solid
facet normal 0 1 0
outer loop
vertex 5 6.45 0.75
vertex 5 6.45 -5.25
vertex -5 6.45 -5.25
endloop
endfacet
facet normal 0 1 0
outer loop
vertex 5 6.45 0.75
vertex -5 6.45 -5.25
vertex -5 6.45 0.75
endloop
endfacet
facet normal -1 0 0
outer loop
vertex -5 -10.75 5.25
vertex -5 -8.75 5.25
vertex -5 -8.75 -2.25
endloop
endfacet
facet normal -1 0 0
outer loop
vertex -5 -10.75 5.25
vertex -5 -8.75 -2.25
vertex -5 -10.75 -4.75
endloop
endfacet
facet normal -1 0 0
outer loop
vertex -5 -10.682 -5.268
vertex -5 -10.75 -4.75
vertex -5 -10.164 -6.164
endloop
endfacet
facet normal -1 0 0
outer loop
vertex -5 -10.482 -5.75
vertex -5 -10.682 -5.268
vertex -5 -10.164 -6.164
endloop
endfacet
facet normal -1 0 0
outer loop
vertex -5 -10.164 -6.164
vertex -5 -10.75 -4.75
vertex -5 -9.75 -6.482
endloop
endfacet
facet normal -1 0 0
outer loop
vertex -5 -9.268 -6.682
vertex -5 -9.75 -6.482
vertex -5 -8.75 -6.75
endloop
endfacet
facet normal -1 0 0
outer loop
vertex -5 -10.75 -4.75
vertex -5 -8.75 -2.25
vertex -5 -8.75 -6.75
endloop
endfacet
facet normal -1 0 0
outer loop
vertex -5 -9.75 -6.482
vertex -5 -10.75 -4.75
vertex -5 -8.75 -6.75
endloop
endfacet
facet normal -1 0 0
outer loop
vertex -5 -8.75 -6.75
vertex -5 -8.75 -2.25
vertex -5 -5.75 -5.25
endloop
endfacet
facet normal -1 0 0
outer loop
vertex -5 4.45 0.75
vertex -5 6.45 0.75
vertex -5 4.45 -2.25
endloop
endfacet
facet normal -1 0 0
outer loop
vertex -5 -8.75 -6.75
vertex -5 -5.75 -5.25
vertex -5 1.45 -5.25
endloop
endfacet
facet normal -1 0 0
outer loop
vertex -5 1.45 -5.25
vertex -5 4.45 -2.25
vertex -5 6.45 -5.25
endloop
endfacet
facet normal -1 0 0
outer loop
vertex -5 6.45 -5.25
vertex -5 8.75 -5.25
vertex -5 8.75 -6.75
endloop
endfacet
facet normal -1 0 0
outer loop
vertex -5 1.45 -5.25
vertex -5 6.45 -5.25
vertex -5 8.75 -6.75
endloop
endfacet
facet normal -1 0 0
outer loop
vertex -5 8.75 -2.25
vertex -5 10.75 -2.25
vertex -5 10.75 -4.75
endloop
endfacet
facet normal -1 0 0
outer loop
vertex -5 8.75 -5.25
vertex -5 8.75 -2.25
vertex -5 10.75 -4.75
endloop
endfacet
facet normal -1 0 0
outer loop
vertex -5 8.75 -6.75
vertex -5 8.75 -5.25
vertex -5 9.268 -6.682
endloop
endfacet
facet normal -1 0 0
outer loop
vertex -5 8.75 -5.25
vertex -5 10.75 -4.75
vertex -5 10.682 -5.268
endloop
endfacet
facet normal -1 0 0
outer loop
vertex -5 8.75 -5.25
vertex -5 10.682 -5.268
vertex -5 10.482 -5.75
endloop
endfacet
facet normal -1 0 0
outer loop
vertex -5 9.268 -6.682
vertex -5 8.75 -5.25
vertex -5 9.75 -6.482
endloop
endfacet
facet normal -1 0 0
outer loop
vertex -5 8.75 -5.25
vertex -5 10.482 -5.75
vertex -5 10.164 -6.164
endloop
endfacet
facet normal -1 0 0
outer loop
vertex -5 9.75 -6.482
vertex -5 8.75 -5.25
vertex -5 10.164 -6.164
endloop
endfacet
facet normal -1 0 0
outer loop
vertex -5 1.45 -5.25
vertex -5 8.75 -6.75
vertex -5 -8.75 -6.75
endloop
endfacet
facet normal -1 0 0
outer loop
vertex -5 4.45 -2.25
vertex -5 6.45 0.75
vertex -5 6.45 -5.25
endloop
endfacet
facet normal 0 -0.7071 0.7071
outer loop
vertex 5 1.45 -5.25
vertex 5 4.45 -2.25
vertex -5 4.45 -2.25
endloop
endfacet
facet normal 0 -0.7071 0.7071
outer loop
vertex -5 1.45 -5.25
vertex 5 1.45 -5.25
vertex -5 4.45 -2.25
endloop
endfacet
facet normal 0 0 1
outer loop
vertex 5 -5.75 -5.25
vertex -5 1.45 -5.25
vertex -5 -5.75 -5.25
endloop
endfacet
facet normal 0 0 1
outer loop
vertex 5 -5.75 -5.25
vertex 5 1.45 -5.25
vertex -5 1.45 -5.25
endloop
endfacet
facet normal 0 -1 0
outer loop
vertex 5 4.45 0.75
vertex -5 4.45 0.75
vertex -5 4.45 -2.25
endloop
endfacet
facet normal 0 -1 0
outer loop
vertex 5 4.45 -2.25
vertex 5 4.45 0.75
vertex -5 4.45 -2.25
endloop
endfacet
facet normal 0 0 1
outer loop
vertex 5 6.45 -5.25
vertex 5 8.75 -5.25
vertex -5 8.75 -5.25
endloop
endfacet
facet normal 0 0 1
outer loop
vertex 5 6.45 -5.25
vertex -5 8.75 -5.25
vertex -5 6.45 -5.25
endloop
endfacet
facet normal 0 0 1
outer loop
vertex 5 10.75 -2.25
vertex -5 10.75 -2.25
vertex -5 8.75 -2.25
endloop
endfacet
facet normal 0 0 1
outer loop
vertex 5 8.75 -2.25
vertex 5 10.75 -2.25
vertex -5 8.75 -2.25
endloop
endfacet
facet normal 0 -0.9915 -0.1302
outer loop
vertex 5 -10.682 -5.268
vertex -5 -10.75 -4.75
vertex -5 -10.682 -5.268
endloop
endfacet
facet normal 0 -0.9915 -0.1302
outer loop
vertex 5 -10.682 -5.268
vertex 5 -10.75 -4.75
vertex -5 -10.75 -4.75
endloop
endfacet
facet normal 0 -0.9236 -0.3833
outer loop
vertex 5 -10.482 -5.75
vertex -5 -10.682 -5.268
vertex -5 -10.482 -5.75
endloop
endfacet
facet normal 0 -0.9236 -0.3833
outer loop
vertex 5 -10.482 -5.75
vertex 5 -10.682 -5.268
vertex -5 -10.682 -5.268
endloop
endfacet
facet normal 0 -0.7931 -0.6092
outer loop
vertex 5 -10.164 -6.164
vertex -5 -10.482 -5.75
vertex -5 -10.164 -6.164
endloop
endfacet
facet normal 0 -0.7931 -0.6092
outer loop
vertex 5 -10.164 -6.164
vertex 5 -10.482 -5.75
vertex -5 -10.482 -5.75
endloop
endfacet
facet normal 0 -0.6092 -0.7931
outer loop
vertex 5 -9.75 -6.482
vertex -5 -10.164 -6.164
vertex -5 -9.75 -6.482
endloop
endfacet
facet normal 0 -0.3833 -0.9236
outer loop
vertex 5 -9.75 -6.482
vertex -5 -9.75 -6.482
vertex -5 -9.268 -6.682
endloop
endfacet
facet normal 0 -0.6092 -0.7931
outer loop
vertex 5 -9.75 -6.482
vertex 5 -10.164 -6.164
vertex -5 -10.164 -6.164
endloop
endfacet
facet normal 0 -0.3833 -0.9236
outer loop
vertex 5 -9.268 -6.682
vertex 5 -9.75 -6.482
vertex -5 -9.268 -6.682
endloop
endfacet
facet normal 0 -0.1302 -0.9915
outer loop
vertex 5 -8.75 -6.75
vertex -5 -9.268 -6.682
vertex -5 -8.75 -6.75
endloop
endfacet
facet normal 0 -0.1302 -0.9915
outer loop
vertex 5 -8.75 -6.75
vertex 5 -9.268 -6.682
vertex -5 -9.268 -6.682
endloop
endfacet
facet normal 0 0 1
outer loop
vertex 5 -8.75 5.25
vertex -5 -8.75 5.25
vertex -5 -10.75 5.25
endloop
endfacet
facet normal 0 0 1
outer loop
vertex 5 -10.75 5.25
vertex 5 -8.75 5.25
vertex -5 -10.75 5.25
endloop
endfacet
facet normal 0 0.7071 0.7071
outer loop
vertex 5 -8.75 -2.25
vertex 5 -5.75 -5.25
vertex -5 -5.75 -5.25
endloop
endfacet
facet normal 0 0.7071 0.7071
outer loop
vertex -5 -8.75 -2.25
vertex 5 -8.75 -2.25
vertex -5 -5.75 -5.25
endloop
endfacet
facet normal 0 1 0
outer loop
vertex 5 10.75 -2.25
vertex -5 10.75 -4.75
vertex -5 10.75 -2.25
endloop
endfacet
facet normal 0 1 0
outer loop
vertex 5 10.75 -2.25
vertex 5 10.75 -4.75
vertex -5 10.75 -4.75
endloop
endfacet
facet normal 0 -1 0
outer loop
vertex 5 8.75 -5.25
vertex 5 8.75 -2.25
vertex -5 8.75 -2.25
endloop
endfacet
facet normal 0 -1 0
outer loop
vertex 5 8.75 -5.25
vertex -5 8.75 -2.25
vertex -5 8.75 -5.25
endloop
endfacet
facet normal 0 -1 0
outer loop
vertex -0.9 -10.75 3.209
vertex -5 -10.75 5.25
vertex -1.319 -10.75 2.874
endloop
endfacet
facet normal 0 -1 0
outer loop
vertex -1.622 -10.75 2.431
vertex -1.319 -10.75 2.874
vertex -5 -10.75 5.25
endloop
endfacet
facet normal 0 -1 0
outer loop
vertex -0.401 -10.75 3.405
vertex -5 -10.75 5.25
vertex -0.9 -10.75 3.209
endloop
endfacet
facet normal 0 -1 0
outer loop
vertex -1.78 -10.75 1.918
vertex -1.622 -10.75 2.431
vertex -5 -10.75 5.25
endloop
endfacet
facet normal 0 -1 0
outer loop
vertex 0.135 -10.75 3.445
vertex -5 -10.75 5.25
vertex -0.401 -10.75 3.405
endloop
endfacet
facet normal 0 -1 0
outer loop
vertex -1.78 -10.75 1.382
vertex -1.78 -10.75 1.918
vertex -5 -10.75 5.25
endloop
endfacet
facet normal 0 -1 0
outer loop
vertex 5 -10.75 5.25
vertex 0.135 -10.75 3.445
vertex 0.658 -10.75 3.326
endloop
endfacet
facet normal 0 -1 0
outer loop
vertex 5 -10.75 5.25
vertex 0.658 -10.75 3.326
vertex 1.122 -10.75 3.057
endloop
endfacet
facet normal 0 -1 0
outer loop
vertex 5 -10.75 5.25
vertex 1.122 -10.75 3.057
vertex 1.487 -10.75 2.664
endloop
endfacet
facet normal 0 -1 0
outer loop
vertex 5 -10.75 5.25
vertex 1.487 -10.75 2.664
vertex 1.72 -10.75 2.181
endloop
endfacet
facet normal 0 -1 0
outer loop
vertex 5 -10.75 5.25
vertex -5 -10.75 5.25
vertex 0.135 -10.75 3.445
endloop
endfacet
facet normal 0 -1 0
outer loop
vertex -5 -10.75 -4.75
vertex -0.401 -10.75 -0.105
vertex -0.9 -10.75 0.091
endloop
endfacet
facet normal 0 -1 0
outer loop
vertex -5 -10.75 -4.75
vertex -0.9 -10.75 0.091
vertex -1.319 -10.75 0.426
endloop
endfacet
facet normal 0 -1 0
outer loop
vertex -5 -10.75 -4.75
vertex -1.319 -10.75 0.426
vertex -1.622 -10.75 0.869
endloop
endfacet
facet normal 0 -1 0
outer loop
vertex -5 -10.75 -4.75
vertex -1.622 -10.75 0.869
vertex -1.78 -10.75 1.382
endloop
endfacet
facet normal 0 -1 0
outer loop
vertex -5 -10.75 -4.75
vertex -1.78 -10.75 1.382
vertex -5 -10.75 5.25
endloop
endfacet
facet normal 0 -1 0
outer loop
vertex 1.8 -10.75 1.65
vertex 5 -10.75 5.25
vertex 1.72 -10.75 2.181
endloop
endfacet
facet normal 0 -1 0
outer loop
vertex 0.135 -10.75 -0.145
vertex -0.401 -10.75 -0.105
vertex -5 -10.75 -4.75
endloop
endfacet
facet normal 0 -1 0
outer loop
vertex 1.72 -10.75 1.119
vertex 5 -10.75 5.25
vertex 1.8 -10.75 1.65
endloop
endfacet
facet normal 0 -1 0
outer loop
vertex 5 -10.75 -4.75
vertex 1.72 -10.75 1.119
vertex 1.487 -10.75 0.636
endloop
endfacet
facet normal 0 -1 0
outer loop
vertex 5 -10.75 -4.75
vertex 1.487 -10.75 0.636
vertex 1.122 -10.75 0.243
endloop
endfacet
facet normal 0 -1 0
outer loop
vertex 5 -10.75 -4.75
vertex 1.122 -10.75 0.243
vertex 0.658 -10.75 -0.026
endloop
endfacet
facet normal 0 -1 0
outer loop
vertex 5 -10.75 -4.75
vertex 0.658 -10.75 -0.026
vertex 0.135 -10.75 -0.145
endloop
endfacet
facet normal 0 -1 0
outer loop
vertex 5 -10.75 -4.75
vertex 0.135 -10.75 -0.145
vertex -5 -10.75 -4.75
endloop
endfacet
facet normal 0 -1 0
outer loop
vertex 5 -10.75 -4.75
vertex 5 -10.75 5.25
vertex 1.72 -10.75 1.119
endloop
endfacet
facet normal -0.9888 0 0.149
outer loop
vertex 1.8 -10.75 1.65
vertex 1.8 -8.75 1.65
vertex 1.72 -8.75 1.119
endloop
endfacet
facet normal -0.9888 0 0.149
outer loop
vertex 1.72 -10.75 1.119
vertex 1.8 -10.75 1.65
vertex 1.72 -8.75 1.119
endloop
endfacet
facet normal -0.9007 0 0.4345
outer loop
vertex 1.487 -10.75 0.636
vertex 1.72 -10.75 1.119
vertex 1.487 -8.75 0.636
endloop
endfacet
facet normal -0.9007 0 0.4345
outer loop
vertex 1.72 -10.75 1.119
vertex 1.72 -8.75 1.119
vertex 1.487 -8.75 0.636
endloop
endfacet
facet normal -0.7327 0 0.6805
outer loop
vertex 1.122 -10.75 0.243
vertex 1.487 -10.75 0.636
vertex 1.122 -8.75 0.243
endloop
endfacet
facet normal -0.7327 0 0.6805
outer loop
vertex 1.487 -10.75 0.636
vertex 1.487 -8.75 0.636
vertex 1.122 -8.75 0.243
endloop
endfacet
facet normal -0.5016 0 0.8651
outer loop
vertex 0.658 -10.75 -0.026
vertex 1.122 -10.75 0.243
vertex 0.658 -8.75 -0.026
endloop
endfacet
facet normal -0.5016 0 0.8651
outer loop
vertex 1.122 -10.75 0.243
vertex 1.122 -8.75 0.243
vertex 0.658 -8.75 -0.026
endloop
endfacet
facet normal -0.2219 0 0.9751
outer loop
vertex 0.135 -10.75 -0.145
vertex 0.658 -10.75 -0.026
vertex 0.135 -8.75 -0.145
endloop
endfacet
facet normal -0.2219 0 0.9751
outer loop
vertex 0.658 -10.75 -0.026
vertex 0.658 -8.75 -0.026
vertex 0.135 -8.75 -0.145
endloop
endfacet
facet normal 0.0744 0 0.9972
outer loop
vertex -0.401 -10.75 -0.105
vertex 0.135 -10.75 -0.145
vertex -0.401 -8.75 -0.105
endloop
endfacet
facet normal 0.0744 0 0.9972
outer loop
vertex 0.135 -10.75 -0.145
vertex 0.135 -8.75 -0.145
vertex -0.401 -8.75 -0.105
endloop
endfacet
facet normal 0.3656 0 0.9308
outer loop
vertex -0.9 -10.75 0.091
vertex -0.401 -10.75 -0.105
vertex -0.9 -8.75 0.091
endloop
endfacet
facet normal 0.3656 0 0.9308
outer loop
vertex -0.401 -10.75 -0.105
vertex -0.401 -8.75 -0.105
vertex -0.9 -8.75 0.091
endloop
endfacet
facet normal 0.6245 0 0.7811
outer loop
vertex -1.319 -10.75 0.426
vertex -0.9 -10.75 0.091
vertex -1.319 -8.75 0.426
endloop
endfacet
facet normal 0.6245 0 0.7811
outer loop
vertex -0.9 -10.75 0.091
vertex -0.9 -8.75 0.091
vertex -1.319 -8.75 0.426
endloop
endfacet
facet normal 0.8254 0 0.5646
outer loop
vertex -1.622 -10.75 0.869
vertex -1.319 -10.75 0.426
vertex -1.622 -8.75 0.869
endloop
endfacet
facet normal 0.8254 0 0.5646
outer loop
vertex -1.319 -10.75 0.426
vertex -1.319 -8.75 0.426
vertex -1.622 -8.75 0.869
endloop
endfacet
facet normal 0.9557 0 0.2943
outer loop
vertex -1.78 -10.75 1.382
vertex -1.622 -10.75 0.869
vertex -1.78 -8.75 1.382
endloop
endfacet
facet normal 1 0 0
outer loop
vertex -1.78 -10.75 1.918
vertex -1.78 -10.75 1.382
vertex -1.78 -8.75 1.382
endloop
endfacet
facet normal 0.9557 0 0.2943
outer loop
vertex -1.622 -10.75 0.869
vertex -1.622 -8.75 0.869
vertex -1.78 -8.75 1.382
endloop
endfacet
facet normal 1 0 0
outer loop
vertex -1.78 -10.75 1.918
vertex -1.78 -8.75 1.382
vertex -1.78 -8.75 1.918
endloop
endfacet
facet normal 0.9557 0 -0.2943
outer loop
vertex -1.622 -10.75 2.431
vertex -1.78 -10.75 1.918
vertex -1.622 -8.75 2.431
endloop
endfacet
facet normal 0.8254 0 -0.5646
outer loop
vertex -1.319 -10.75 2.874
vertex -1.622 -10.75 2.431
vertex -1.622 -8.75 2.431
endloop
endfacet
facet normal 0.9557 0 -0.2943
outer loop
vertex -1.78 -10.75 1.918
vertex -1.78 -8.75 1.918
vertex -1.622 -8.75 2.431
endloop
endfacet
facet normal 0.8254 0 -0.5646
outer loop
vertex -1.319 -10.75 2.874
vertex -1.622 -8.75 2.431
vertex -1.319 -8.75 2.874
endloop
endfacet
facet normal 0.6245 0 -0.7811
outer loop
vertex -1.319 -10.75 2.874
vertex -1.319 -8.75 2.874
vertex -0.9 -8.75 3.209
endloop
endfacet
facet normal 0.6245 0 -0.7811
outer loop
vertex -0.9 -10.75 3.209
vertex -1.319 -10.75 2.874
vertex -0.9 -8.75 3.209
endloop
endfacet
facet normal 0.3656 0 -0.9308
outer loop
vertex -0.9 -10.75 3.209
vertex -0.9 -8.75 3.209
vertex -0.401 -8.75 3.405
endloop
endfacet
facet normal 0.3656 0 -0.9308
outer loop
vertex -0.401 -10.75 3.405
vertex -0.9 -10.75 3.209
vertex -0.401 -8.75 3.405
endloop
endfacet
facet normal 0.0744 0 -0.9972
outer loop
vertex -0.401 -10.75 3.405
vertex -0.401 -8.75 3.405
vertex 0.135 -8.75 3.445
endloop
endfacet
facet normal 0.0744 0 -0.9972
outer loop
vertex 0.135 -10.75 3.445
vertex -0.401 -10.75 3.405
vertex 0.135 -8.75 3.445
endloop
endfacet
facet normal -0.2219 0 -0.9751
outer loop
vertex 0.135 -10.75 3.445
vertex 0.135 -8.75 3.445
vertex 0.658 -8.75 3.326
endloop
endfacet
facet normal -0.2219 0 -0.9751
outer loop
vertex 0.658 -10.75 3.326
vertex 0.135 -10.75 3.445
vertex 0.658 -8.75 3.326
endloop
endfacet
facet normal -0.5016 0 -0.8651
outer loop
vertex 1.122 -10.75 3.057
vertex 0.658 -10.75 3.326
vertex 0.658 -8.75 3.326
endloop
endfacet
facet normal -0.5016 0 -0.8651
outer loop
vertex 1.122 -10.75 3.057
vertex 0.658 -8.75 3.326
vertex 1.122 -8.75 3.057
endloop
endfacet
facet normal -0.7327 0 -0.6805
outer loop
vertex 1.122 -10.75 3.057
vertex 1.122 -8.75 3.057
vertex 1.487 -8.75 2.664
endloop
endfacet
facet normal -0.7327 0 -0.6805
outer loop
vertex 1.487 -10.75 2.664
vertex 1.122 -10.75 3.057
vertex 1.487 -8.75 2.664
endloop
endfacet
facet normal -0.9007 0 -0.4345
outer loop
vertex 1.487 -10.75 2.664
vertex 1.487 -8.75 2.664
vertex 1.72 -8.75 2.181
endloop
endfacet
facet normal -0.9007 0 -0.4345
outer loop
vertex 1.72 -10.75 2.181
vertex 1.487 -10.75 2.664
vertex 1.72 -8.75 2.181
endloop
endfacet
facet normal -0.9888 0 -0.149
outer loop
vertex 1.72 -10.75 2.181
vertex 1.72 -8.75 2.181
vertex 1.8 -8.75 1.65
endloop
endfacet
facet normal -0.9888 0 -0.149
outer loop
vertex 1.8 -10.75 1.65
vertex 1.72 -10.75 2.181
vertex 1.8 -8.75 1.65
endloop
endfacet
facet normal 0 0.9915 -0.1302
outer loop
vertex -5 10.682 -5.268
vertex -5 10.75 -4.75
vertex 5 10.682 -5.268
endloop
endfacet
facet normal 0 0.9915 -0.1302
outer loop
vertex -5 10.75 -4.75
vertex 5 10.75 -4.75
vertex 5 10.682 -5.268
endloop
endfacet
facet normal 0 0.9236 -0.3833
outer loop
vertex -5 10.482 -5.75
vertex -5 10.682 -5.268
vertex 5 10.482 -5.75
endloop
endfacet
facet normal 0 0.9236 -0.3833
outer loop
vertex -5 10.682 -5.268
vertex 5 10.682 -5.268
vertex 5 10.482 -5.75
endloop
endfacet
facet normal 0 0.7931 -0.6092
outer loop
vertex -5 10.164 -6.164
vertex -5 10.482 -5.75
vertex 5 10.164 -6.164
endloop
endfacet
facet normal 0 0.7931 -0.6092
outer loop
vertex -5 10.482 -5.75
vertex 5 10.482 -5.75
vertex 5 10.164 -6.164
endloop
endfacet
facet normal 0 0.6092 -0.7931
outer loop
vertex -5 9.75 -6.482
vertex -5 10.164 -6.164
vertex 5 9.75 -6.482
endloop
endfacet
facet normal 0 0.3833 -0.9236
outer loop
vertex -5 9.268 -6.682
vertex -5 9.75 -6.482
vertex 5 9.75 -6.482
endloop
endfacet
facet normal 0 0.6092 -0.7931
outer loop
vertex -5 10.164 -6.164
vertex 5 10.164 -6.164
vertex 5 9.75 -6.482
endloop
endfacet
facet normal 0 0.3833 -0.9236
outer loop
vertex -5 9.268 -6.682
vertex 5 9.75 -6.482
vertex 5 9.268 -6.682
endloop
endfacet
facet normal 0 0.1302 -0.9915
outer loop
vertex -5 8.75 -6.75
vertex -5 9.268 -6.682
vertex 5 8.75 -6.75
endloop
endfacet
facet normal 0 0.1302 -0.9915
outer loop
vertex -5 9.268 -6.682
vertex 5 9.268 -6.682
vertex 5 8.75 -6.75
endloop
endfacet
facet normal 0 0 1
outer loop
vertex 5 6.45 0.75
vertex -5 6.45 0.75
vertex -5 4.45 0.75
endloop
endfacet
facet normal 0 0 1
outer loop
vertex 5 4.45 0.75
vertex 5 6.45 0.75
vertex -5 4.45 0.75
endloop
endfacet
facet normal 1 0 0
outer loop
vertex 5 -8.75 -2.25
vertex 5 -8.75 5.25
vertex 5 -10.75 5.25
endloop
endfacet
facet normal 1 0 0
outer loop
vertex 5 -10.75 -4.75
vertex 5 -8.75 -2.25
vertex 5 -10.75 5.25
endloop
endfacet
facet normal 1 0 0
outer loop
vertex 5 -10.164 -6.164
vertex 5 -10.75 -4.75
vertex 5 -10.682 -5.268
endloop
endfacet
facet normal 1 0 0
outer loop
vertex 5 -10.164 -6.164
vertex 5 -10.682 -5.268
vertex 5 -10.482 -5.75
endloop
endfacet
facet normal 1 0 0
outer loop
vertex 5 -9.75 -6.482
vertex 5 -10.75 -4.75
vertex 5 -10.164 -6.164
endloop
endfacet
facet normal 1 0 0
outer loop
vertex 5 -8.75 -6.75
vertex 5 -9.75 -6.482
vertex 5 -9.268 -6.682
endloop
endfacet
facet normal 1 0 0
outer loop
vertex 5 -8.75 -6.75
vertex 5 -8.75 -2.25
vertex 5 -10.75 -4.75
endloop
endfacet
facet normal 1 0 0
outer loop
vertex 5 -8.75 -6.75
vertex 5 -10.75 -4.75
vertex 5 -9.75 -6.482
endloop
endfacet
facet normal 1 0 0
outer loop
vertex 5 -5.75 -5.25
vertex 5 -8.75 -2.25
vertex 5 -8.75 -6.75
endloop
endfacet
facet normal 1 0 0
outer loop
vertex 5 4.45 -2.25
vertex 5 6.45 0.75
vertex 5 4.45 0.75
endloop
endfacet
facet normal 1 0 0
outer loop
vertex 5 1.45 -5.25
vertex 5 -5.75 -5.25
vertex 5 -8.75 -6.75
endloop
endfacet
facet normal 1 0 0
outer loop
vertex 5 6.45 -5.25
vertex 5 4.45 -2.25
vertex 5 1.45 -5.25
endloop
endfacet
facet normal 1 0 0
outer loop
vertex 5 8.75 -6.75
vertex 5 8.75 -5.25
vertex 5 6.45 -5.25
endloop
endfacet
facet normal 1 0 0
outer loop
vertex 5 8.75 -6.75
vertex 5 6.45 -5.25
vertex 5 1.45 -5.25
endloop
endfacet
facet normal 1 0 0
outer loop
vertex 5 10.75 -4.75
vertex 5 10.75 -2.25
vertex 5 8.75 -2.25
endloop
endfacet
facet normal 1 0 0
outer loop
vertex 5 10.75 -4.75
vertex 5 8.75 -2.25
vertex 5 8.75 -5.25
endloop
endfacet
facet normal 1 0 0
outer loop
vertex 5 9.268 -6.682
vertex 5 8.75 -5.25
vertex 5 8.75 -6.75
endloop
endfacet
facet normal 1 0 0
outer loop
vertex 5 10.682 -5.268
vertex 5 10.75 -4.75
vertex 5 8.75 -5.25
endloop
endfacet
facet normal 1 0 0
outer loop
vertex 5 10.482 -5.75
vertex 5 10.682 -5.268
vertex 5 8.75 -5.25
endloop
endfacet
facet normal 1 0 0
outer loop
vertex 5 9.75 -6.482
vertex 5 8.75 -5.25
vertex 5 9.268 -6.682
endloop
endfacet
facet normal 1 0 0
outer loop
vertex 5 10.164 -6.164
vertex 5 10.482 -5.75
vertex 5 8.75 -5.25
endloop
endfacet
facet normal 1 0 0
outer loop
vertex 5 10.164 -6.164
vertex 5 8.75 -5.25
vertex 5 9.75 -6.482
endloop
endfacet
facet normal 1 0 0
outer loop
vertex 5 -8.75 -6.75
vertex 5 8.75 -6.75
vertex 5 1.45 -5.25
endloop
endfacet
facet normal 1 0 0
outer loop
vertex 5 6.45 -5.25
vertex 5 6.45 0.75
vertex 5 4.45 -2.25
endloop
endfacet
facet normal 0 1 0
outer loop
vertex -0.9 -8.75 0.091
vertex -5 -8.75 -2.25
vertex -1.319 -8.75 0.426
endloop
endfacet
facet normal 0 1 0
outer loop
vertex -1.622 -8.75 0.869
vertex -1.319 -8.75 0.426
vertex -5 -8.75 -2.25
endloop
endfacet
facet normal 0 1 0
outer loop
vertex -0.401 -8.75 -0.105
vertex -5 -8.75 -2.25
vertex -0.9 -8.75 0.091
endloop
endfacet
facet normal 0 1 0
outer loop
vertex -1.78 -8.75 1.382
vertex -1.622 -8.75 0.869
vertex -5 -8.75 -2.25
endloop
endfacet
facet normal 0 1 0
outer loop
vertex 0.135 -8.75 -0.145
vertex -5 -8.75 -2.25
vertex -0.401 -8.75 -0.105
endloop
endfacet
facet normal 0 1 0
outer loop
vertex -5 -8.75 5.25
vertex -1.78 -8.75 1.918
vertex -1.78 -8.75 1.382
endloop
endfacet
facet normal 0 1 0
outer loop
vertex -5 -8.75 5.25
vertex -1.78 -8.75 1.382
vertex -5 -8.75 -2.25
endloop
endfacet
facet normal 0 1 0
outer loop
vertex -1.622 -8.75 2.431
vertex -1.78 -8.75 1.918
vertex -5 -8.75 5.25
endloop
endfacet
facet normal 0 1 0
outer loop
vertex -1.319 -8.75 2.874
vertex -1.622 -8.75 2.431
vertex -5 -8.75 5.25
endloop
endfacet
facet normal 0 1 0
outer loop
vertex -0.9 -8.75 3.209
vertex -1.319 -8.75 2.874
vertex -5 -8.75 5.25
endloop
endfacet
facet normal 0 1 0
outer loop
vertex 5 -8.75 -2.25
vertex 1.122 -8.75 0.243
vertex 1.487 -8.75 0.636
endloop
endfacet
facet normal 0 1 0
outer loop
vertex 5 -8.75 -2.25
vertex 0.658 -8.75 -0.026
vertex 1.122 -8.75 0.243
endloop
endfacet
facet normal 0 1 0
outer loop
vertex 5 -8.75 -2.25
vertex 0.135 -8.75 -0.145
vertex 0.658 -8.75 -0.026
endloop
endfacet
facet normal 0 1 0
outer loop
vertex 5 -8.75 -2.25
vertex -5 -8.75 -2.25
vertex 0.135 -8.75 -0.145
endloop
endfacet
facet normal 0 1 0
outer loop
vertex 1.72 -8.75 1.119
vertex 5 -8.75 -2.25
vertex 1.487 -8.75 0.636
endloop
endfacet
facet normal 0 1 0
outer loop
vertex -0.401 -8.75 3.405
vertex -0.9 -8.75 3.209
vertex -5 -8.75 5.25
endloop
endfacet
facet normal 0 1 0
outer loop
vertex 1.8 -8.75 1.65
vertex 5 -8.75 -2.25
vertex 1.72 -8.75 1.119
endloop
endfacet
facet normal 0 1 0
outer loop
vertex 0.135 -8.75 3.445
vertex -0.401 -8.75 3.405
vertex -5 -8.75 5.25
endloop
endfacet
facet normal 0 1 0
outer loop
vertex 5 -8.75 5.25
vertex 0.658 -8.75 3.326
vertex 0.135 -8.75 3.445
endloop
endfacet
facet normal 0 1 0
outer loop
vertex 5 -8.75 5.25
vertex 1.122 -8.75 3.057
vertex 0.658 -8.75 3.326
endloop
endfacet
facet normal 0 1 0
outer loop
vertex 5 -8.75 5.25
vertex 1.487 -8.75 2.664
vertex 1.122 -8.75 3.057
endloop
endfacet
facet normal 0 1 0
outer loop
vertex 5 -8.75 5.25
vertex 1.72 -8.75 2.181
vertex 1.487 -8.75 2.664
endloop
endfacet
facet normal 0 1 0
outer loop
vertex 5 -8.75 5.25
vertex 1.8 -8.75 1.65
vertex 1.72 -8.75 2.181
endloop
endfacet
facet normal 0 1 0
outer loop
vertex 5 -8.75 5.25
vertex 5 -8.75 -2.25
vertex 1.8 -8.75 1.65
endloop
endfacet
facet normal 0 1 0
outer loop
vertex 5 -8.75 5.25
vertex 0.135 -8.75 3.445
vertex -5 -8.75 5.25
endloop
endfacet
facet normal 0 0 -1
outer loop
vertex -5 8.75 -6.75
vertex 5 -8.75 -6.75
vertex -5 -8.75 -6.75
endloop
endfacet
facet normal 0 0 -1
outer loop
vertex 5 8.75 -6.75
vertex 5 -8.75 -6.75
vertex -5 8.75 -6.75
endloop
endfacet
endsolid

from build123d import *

# Parameters (mm, degrees)
BOSS_EXTRUDE1_DEPTH     = 5
CHAMFER1_SIZE           = 3
SKETCH2_R               = 1.8
CUT_EXTRUDE1_DEPTH      = 3
CUT_EXTRUDE1_DEPTH_BACK = 3
FILLET1_R               = 2


with BuildPart() as part:
    # Sketch1 → Boss-Extrude1 (new body, symmetric)
    with BuildSketch(Plane(origin=(0, 0, 0), x_dir=(0, 0, -1), z_dir=(1, 0, 0))):
        Polygon((-5.25, -8.75), (-5.25, -10.75), (6.75, -10.75), (6.75, 10.75), (2.25, 10.75), (2.25, 8.75), (5.25, 8.75), (5.25, 6.45), (-0.75, 6.45), (-0.75, 4.45), (5.25, 4.45), (5.25, -8.75), align=None)
    extrude(amount=BOSS_EXTRUDE1_DEPTH, both=True)

    # Chamfer1
    chamfer1_edges = [part.edges().sort_by_distance(p)[0] for p in [
        (0, -8.75, -5.25),
        (0, 4.45, -5.25),
    ]]
    chamfer(chamfer1_edges, length=CHAMFER1_SIZE)

    # Sketch2 → Cut-Extrude1 (cut, two sides)
    with BuildSketch(Plane(origin=(0, -8.75, 0), x_dir=(1, 0, 0), z_dir=(0, 1, 0))) as cut_extrude1_sk:
        with Locations((0, -1.65)):
            Circle(SKETCH2_R)
    extrude(amount=CUT_EXTRUDE1_DEPTH, mode=Mode.SUBTRACT)
    extrude(cut_extrude1_sk.sketch, amount=-CUT_EXTRUDE1_DEPTH_BACK, mode=Mode.SUBTRACT)

    # Fillet1
    fillet1_edges = [part.edges().sort_by_distance(p)[0] for p in [
        (0, 10.75, -6.75),
        (0, -10.75, -6.75),
    ]]
    fillet(fillet1_edges, radius=FILLET1_R)


solid = part.part
